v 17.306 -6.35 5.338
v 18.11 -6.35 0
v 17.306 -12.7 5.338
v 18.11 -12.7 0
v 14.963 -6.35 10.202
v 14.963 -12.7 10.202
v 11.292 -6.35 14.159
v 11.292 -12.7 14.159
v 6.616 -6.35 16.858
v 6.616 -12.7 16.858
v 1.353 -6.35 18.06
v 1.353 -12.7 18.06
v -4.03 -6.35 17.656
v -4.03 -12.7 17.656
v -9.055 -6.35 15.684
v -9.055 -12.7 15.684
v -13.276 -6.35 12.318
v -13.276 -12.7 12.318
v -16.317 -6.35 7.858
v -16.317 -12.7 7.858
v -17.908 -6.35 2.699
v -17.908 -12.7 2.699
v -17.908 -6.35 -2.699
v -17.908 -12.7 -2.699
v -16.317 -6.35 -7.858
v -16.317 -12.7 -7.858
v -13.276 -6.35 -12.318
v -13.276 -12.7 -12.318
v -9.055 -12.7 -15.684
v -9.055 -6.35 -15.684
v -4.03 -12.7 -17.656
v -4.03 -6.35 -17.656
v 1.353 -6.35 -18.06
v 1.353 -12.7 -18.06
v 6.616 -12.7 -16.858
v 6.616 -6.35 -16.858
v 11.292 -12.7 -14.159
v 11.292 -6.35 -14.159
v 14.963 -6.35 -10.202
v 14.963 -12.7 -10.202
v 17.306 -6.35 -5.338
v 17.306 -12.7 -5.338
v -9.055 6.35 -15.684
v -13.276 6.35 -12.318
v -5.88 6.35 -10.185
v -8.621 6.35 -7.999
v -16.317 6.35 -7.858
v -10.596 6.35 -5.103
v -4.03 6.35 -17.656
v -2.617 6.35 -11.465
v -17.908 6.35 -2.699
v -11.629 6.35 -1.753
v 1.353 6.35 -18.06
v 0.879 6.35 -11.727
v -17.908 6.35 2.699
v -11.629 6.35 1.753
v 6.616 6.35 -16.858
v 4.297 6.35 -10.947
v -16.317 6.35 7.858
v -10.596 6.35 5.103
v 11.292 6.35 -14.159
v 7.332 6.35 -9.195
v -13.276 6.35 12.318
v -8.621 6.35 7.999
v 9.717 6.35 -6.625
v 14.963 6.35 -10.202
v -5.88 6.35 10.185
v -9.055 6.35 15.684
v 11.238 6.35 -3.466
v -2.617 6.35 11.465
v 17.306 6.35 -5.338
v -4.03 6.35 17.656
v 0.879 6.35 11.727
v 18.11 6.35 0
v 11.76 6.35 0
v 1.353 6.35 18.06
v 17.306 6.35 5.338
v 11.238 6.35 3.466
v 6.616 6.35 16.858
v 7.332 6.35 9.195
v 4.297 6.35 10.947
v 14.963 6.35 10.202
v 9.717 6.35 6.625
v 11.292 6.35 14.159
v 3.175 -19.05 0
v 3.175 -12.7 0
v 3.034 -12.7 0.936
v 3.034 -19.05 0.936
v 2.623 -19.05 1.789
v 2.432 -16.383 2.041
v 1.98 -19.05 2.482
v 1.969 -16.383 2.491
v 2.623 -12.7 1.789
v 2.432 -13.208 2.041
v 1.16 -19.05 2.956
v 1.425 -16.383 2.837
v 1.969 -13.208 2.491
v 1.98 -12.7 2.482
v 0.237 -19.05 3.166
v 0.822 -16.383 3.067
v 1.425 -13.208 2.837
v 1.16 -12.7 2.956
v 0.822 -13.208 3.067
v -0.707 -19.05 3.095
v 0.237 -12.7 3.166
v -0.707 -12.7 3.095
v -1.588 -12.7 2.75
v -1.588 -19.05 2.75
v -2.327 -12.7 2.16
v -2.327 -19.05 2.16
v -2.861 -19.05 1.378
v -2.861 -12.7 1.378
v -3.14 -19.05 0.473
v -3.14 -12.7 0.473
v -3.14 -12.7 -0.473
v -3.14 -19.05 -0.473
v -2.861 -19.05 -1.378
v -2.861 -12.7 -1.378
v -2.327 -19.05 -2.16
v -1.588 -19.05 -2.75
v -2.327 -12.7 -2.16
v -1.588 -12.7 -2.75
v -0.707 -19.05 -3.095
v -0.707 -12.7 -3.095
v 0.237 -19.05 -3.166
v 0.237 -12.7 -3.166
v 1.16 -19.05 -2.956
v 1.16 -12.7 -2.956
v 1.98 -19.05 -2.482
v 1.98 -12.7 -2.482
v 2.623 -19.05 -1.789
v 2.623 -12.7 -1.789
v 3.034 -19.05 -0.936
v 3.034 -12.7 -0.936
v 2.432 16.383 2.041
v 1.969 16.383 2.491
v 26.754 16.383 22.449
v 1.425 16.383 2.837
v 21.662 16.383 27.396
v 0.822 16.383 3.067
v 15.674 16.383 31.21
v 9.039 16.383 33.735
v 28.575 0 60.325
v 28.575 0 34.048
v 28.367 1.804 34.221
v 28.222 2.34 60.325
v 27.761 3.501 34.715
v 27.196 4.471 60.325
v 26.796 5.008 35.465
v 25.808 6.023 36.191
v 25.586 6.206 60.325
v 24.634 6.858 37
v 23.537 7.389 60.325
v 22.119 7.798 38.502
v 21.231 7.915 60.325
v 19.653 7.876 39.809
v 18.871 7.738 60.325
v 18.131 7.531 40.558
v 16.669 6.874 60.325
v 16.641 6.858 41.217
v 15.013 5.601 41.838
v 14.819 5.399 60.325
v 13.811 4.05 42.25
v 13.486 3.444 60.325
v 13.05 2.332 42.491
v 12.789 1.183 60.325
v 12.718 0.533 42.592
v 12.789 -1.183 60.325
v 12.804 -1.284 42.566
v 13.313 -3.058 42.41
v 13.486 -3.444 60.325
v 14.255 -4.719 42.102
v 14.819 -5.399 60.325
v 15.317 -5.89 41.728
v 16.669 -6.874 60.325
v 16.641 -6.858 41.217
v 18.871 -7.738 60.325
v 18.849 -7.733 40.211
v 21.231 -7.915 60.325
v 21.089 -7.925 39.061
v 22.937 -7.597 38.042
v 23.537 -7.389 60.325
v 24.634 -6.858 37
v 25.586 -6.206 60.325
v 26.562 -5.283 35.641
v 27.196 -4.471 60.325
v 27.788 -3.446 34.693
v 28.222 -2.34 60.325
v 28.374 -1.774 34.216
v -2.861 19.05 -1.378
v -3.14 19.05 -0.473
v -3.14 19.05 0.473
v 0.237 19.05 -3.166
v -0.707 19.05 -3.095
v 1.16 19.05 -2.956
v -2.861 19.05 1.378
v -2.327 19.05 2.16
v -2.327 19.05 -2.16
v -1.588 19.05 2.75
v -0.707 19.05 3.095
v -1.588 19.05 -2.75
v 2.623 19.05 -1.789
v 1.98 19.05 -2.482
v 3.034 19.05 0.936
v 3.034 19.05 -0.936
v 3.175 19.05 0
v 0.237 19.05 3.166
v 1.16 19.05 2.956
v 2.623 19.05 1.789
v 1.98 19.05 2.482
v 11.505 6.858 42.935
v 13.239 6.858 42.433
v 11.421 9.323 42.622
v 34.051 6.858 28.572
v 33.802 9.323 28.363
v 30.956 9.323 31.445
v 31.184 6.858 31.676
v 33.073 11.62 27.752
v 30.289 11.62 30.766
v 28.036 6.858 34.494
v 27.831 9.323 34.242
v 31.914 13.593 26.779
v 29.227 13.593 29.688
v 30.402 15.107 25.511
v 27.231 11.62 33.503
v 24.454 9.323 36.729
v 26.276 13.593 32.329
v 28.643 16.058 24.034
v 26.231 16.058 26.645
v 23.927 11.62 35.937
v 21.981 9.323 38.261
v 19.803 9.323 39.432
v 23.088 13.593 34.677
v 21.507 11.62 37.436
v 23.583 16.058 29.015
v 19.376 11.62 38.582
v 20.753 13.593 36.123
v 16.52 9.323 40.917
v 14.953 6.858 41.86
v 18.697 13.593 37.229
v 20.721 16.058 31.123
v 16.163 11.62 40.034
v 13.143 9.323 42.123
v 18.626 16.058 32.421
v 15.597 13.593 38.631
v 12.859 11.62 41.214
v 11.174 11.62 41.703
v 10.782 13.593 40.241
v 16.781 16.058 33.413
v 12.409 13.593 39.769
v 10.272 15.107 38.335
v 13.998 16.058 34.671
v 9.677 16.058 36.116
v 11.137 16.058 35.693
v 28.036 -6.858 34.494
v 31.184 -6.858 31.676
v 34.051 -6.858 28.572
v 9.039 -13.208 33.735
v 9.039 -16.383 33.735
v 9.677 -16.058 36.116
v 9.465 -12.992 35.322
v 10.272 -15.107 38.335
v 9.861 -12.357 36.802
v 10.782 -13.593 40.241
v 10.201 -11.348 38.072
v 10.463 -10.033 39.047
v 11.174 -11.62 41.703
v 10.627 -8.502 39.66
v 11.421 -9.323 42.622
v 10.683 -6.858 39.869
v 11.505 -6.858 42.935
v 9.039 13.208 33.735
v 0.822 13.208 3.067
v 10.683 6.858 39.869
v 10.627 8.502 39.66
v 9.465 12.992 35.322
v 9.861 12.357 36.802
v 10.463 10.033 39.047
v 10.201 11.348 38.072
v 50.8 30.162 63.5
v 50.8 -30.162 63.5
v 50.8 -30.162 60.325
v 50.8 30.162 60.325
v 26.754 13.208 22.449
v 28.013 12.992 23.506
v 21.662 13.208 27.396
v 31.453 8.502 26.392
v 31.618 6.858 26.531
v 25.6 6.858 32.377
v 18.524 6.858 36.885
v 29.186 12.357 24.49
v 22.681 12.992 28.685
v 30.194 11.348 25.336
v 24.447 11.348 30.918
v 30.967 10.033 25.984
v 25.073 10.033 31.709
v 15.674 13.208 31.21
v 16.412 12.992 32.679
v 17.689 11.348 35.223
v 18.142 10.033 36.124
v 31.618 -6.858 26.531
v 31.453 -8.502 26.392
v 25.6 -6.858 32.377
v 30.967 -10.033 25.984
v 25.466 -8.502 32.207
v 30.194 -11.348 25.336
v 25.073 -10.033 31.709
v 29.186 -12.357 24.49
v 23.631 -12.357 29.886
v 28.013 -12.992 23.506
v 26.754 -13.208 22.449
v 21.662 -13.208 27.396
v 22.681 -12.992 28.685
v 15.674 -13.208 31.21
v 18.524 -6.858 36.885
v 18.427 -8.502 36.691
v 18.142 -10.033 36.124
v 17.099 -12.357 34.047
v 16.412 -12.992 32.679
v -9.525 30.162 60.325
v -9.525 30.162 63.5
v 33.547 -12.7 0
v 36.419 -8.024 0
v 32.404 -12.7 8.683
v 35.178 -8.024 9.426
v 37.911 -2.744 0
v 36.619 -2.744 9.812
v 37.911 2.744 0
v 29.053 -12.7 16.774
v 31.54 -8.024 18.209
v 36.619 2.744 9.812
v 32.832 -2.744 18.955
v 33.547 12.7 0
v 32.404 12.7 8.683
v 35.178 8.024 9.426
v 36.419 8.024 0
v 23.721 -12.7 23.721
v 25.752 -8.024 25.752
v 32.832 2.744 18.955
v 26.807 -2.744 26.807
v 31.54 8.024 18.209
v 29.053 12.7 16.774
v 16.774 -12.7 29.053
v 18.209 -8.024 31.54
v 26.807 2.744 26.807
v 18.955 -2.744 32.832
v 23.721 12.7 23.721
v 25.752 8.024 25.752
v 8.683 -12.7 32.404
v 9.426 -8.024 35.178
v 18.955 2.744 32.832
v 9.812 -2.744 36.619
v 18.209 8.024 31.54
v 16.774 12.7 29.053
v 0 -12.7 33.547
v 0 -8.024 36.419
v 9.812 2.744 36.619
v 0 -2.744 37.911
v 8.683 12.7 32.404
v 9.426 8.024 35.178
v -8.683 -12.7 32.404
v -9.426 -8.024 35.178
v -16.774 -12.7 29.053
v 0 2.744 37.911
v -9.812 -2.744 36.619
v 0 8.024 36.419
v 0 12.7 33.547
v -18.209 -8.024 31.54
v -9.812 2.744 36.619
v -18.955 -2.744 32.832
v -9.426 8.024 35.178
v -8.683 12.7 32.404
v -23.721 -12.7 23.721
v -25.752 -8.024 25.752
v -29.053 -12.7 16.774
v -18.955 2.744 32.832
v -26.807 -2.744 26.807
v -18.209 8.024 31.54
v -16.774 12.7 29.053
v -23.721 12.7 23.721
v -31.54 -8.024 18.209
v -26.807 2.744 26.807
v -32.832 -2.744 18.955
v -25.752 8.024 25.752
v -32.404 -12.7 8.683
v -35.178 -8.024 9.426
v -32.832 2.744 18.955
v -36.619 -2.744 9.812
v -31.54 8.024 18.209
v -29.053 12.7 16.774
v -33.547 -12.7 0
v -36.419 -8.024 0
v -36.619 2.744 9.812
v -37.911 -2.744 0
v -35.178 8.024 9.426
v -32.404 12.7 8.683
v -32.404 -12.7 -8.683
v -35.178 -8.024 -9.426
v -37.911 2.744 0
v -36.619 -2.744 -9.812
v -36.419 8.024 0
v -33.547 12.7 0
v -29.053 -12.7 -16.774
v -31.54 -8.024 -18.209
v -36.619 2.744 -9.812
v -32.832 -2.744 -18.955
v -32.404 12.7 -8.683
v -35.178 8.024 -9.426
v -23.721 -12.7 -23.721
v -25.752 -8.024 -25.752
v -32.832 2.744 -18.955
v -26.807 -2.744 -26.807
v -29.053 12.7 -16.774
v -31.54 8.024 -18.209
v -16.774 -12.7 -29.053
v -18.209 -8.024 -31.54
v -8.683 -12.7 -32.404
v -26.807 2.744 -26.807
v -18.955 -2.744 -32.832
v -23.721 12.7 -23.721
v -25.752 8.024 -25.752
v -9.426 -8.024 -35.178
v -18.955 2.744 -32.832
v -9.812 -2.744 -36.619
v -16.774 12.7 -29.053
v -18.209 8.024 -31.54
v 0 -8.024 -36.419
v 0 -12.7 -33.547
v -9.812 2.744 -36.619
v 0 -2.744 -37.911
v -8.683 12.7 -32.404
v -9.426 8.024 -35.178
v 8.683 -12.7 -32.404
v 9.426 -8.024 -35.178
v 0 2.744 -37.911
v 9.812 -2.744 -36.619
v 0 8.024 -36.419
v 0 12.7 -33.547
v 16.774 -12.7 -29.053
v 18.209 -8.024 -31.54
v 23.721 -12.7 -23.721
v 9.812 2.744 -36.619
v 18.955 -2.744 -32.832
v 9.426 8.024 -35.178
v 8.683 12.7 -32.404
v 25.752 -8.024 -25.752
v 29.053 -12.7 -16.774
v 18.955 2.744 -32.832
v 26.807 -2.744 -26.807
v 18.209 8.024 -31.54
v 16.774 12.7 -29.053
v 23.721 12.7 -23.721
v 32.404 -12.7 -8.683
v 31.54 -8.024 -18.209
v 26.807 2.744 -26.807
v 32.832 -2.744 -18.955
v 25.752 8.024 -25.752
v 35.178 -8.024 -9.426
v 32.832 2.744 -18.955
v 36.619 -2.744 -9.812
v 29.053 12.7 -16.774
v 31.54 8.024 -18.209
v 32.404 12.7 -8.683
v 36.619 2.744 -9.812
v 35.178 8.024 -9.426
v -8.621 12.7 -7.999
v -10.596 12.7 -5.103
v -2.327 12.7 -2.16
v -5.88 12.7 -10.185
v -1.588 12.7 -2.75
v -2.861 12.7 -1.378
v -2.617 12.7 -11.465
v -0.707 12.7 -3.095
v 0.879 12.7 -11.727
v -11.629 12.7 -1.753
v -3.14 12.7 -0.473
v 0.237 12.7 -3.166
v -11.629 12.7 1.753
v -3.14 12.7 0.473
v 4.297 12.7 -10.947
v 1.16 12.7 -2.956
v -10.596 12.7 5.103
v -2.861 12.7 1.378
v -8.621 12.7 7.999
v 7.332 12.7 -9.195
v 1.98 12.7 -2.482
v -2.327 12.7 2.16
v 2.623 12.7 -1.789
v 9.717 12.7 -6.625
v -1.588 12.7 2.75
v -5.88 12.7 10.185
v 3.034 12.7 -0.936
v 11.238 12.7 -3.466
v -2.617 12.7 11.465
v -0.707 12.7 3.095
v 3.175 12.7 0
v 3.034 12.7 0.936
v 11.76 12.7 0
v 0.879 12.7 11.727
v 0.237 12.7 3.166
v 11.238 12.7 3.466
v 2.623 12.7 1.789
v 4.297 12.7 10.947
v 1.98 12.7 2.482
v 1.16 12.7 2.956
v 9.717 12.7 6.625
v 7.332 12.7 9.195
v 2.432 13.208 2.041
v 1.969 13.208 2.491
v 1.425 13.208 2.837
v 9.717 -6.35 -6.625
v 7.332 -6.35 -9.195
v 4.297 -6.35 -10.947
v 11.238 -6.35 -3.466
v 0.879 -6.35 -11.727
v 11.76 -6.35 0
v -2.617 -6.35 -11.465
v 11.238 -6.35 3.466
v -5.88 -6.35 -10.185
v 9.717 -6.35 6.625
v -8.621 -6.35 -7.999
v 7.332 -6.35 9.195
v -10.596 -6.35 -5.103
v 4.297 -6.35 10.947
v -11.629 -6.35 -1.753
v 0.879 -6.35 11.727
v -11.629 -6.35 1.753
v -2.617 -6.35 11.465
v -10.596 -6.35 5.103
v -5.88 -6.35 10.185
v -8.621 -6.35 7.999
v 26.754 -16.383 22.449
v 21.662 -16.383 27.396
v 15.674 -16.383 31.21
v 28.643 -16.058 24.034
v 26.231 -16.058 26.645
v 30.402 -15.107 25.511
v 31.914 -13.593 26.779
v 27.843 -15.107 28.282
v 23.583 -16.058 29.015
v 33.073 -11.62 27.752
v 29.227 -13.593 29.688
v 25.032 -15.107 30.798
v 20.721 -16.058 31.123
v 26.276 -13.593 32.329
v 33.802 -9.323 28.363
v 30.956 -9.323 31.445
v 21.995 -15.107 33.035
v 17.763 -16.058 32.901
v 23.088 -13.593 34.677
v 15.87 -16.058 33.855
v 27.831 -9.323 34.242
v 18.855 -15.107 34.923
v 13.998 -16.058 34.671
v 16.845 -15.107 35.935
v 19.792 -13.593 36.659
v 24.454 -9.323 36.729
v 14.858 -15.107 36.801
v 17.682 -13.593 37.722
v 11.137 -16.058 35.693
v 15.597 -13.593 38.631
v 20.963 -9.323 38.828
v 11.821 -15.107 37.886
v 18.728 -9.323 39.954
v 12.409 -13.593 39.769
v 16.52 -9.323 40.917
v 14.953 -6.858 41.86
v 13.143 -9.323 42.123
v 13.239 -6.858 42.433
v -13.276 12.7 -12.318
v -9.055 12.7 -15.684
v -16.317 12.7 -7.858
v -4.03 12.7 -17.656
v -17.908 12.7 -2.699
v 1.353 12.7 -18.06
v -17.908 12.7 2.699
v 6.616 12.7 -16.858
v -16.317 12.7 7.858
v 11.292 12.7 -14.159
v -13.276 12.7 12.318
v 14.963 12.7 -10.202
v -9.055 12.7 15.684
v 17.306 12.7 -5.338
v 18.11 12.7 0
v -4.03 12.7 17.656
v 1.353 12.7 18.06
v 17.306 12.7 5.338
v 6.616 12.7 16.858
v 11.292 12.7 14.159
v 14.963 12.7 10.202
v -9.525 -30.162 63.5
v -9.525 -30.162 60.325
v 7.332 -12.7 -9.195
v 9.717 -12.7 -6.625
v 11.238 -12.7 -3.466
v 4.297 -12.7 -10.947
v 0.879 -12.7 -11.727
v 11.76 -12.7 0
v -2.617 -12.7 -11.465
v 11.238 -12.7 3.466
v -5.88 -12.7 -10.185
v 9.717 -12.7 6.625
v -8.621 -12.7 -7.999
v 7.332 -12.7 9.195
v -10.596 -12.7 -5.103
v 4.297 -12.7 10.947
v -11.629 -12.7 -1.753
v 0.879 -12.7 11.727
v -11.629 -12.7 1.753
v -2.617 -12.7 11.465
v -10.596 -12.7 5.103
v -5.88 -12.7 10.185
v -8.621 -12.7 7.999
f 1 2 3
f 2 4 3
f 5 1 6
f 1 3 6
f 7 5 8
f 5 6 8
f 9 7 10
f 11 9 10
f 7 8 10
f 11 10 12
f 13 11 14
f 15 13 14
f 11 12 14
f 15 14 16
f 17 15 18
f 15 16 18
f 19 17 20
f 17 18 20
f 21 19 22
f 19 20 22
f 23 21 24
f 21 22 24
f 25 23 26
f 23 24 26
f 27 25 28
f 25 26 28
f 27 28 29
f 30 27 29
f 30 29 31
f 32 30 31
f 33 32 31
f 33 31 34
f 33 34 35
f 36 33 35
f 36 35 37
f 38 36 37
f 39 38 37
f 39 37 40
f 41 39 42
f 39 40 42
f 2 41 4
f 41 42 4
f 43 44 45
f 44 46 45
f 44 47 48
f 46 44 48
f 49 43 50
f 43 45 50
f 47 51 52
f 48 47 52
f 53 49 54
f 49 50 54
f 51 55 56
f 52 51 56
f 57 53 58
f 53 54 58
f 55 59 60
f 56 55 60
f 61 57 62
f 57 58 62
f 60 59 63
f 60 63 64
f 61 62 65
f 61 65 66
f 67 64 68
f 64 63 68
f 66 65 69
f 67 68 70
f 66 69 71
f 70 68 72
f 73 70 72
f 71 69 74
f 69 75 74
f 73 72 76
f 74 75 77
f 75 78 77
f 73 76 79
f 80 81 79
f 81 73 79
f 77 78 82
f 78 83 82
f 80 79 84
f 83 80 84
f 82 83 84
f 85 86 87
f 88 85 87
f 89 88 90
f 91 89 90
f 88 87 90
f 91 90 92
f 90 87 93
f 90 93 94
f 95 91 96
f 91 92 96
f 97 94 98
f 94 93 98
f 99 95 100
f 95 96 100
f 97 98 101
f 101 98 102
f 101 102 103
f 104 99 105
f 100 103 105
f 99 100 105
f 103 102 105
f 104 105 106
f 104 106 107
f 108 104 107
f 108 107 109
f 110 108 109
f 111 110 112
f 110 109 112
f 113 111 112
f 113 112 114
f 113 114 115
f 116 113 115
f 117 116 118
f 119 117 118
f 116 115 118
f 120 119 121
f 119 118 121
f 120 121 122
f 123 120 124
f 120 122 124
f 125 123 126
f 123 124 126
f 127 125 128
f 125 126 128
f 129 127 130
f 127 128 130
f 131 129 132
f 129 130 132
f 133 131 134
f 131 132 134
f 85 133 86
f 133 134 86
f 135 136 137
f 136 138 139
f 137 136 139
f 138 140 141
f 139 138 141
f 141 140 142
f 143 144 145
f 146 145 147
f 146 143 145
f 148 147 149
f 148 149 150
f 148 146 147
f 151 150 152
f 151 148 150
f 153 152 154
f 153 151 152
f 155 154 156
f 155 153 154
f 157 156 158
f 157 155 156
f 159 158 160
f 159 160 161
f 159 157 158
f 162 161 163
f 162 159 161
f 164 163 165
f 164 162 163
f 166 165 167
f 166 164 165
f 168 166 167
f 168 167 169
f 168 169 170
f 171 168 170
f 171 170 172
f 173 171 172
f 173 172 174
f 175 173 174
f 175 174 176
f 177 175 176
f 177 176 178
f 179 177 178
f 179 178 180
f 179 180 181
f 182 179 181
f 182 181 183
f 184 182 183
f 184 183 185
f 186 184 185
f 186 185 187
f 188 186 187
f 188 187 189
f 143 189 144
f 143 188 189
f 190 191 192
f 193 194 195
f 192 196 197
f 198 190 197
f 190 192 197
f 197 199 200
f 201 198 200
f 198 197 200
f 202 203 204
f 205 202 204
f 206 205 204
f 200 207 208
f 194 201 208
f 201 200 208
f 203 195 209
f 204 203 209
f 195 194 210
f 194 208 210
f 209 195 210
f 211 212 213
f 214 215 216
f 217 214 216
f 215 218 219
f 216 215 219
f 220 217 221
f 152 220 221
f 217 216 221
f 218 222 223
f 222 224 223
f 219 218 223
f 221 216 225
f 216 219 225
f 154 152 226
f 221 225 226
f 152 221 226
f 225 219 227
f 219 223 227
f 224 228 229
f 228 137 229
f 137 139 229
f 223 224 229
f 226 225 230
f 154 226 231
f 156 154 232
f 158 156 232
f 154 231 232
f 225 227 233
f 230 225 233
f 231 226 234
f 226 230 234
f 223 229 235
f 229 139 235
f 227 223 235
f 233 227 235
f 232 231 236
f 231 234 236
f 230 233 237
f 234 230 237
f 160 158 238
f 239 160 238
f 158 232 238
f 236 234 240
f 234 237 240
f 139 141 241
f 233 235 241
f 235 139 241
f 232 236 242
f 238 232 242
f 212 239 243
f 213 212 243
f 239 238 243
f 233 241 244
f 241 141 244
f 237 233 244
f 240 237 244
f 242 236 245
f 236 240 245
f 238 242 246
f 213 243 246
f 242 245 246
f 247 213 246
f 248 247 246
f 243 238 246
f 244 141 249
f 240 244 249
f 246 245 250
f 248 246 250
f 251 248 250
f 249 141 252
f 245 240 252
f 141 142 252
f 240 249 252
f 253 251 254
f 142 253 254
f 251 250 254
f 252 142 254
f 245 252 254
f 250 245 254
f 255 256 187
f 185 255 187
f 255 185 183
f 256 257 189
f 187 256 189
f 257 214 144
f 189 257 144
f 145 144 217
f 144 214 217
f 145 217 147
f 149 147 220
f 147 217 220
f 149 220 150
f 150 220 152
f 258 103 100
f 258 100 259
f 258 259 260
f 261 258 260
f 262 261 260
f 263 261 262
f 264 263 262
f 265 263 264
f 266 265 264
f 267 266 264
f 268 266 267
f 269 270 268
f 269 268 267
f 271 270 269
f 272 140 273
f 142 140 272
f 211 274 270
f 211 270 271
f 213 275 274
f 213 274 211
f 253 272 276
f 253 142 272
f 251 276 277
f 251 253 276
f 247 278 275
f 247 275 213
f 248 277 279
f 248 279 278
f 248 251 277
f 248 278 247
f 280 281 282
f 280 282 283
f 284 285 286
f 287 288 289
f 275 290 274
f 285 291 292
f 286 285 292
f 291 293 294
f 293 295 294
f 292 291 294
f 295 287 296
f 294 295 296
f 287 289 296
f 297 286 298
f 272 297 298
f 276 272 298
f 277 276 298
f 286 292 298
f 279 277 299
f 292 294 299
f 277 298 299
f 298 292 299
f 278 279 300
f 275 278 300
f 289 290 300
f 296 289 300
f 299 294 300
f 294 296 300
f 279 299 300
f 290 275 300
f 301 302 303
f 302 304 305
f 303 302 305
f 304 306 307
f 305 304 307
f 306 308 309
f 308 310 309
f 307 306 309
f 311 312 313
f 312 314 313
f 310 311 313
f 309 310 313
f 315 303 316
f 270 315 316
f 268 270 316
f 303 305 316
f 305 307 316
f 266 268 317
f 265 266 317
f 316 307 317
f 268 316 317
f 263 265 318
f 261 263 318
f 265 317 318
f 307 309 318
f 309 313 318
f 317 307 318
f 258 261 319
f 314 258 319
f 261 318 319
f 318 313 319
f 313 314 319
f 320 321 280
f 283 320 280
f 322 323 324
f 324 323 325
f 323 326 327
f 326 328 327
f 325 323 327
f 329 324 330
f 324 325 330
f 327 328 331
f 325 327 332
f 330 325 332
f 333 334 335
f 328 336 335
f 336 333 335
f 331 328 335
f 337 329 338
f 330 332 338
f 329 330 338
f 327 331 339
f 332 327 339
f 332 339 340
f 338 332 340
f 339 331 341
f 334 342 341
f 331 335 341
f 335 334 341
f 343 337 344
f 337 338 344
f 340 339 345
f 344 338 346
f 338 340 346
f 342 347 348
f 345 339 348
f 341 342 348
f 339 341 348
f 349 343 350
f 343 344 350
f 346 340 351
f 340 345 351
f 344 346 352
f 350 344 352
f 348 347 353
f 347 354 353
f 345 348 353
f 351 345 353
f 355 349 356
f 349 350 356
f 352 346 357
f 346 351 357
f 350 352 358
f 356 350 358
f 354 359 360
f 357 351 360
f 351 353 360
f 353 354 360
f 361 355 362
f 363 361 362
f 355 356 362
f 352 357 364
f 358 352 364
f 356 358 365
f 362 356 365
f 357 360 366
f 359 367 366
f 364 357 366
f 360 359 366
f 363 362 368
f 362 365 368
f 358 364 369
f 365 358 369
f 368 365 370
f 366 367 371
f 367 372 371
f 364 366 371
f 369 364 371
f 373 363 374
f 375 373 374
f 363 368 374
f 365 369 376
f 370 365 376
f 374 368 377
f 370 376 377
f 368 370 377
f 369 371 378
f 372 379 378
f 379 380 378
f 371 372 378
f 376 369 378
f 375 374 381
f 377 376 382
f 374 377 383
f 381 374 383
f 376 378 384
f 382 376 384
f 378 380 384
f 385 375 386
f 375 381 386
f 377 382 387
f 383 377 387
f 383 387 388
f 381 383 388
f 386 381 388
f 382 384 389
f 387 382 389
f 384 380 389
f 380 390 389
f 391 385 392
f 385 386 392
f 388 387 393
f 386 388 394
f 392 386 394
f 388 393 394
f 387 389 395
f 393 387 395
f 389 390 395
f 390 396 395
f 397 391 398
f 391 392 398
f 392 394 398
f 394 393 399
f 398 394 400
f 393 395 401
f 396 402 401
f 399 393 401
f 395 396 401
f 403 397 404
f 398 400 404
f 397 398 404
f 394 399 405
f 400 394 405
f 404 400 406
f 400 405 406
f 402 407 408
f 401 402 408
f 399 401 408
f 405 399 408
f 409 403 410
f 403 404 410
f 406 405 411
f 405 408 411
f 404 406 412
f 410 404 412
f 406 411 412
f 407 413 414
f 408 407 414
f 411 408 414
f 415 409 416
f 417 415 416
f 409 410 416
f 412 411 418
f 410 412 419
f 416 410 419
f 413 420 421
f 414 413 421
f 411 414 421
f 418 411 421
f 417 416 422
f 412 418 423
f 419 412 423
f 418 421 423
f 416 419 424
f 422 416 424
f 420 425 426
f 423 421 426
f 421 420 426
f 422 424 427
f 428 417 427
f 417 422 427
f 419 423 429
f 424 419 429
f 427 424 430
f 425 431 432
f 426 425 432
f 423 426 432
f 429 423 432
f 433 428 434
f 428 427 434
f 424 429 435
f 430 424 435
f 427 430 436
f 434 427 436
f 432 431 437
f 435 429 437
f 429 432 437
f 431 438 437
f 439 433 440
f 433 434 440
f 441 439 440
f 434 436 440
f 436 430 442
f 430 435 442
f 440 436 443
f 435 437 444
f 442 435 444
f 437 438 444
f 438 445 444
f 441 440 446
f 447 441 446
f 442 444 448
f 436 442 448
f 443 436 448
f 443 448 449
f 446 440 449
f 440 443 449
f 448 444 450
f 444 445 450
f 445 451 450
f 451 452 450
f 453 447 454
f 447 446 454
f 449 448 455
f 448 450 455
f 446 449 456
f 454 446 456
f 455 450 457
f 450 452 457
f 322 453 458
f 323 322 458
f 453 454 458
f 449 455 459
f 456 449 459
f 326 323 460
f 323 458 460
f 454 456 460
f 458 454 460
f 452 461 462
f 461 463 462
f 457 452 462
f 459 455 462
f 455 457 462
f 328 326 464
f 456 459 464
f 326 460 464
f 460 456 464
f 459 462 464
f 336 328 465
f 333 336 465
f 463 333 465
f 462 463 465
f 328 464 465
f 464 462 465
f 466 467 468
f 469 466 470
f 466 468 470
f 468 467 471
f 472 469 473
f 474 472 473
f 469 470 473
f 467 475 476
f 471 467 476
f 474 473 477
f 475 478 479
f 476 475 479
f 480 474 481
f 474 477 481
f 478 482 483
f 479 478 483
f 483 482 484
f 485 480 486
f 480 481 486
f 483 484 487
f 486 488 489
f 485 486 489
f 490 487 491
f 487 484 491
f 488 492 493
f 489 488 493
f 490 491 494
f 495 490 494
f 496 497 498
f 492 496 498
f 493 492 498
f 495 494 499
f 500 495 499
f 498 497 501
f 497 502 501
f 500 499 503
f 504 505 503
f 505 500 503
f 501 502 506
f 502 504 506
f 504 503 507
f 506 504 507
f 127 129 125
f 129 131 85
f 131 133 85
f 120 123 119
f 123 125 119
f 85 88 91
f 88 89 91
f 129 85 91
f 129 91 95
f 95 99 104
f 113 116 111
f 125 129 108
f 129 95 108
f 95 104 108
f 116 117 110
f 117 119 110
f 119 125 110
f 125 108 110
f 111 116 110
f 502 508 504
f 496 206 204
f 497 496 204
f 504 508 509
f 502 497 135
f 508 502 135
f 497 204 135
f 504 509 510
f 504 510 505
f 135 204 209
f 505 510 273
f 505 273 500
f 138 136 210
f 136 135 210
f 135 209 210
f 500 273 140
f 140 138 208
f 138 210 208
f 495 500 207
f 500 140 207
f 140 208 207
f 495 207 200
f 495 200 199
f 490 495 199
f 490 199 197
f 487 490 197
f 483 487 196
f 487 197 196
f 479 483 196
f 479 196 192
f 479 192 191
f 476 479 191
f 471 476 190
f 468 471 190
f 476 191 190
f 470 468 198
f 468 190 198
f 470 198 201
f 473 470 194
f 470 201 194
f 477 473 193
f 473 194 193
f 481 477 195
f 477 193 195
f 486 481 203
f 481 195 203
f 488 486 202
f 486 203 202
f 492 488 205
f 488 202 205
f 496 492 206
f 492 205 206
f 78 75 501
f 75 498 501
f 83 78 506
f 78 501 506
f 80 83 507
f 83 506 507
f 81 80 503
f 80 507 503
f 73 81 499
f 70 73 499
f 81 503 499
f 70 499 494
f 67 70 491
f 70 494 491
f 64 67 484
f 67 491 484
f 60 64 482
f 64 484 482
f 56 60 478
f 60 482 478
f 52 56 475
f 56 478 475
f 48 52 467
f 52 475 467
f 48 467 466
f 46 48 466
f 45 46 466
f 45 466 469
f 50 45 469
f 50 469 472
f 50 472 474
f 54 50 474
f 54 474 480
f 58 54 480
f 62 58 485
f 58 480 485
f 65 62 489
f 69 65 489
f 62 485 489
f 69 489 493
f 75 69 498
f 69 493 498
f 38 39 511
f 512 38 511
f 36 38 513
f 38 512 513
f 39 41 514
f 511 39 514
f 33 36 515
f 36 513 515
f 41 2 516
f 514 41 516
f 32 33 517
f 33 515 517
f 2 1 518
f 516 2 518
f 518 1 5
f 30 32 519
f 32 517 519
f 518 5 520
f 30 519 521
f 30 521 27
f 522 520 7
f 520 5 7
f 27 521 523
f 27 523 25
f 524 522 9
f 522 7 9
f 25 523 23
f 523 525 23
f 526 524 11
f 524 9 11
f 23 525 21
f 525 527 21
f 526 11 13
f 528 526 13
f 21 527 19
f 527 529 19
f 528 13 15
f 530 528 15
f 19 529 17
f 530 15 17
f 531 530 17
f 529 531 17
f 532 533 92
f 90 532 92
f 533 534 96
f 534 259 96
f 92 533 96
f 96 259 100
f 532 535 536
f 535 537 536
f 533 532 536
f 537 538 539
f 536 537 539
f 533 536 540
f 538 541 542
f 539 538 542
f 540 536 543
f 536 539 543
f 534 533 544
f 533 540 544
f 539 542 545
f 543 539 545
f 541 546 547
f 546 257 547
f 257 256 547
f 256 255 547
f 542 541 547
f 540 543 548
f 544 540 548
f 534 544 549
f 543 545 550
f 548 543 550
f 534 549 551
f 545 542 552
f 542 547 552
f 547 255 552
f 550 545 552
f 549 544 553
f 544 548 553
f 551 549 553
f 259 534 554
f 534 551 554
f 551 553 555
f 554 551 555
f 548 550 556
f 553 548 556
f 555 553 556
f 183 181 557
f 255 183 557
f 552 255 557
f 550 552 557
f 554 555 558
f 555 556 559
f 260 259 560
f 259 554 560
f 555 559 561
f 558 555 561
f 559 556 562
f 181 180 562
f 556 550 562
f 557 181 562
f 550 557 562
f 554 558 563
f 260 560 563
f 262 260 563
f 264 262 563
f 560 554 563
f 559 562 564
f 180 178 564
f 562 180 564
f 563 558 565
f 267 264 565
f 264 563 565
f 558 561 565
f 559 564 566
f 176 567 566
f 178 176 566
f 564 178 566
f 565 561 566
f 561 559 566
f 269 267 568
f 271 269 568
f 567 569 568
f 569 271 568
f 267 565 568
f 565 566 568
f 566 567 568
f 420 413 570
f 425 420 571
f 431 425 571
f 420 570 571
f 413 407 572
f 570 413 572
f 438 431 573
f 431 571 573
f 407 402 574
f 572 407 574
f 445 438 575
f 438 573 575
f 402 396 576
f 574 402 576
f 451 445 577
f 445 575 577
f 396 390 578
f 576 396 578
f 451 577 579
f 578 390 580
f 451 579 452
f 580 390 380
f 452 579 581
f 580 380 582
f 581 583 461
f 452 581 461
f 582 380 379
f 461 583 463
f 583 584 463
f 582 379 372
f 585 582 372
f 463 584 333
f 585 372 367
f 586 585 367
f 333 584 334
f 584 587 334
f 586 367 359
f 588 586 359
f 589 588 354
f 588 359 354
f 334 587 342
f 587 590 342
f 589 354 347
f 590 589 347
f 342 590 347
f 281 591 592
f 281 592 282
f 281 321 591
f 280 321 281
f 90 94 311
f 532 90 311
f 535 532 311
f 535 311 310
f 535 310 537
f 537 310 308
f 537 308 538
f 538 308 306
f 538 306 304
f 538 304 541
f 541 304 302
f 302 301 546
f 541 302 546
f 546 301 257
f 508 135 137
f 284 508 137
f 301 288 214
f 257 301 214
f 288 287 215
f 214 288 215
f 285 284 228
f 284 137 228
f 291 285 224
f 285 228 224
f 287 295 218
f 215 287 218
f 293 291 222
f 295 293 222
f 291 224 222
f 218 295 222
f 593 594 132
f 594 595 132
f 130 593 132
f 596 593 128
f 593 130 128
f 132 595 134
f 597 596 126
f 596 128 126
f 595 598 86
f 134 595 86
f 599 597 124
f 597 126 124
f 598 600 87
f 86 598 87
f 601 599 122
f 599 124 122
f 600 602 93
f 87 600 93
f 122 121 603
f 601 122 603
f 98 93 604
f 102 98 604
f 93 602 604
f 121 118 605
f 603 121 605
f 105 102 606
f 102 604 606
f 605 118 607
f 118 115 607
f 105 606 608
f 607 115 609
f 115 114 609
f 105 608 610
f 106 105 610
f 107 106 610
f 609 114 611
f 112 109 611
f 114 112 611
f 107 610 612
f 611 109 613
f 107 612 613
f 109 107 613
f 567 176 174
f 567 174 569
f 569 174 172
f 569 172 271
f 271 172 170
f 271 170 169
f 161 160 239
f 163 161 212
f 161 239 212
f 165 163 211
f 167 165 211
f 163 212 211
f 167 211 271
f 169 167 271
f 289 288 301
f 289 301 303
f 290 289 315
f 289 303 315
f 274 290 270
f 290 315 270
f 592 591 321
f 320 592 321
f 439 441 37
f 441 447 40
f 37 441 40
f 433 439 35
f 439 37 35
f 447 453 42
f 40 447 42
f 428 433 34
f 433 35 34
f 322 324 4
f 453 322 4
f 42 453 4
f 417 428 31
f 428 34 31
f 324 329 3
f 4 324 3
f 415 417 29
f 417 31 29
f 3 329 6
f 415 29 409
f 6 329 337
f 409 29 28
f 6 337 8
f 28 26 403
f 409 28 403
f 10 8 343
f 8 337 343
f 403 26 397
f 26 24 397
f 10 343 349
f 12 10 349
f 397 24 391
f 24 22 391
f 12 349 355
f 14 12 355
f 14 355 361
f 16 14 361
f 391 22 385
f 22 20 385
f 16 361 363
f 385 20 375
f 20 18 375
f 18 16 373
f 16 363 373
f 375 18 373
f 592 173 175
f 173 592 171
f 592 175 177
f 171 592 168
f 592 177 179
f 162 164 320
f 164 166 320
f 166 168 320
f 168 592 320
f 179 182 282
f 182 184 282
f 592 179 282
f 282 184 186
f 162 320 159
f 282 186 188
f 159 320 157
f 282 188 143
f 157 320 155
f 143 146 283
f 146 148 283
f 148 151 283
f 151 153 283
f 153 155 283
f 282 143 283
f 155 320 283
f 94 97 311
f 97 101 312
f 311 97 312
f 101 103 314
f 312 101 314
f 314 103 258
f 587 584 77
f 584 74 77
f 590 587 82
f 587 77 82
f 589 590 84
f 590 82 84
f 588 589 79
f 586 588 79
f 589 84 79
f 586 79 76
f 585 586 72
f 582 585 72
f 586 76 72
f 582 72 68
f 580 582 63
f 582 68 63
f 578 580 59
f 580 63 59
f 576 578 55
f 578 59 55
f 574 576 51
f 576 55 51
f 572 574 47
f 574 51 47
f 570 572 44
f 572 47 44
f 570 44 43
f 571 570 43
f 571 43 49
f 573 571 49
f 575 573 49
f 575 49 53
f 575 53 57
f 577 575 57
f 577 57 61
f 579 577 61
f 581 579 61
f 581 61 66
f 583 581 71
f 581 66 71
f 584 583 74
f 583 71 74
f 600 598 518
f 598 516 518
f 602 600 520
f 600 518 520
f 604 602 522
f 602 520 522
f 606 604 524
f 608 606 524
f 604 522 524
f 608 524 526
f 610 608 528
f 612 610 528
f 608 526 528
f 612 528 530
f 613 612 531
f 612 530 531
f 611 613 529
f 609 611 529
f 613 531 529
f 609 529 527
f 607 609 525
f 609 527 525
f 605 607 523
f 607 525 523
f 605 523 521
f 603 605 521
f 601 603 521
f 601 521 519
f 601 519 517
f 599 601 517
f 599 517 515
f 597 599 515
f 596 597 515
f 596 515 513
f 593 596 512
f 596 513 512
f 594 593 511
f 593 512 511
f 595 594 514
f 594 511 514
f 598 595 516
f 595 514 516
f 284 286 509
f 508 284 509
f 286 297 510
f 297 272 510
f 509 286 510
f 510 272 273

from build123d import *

# Parameters (mm, degrees)
F3_ANGLE_START = 40
F3_ANGLE       = 35
F6_R           = 7.9375
F5_W           = 60.325
F5_H           = 60.325
F8_DEPTH       = 3.175


with BuildPart() as f1:
    # F0 (on Top) → F1 (revolve)
    with BuildSketch(Plane.XY):
        with BuildLine():
            Line((3.175, -19.05), (3.175, -12.7))
            Line((3.175, -12.7), (11.7603466757, -12.7))
            Line((11.7603466757, -12.7), (11.7603466757, -6.35))
            Line((11.7603466757, -6.35), (18.1103466757, -6.35))
            Line((18.1103466757, -6.35), (18.1103466757, -12.7))
            Line((18.1103466757, -12.7), (33.5471935048, -12.7))
            ThreePointArc((33.5471935048, -12.7), (38.1, 0), (33.5471935048, 12.7))
            Line((33.5471935048, 12.7), (18.1103466757, 12.7))
            Line((18.1103466757, 12.7), (18.1103466757, 6.35))
            Line((18.1103466757, 6.35), (11.7603466757, 6.35))
            Line((11.7603466757, 6.35), (11.7603466757, 12.7))
            Line((11.7603466757, 12.7), (3.175, 12.7))
            Line((3.175, 12.7), (3.175, 19.05))
            Line((3.175, 19.05), (0, 19.05))
            Line((0, 19.05), (0, -19.05))
            Line((0, -19.05), (3.175, -19.05))
        make_face()
    revolve(axis=Axis((0, 0, 0), (0, -1, 0)))

    # F2 (on Top) → F3 (revolve)
    with BuildSketch(Plane.XY, mode=Mode.PRIVATE) as f3_sk:
        with BuildLine():
            Line((0, 16.383), (0, 13.208))
            Line((0, 13.208), (34.925, 13.208))
            ThreePointArc((34.925, 13.208), (39.4151280605, 11.3481280605), (41.275, 6.858))
            Line((41.275, 6.858), (41.275, 0))
            Line((41.275, 0), (41.275, -6.858))
            ThreePointArc((41.275, -6.858), (39.4151280605, -11.3481280605), (34.925, -13.208))
            Line((34.925, -13.208), (0, -13.208))
            Line((0, -13.208), (0, -16.383))
            Line((0, -16.383), (34.925, -16.383))
            ThreePointArc((34.925, -16.383), (41.6601920908, -13.5931920908), (44.45, -6.858))
            Line((44.45, -6.858), (44.45, 0))
            Line((44.45, 0), (44.45, 6.858))
            ThreePointArc((44.45, 6.858), (41.6601920908, 13.5931920908), (34.925, 16.383))
            Line((34.925, 16.383), (0, 16.383))
        make_face()
    revolve(f3_sk.sketch.rotate(Axis((0, 23.489471525, 0), (0, -1, 0)), F3_ANGLE_START), axis=Axis((0, 23.489471525, 0), (0, -1, 0)), revolution_arc=F3_ANGLE)

    # F6 (on offset) → F7 (join, up to the next surface of F1)
    with BuildSketch(Plane.XY.offset(63.5)):
        with Locations((20.6375, 0)):
            Circle(F6_R)
    extrude(until=Until.NEXT, dir=(0, 0, -1))

    # F5 (on offset) → F8 (join)
    with BuildSketch(Plane.XY.offset(63.5)):
        with Locations((20.6375, 0)):
            Rectangle(F5_W, F5_H)
    extrude(amount=-F8_DEPTH)


solid = f1.part
